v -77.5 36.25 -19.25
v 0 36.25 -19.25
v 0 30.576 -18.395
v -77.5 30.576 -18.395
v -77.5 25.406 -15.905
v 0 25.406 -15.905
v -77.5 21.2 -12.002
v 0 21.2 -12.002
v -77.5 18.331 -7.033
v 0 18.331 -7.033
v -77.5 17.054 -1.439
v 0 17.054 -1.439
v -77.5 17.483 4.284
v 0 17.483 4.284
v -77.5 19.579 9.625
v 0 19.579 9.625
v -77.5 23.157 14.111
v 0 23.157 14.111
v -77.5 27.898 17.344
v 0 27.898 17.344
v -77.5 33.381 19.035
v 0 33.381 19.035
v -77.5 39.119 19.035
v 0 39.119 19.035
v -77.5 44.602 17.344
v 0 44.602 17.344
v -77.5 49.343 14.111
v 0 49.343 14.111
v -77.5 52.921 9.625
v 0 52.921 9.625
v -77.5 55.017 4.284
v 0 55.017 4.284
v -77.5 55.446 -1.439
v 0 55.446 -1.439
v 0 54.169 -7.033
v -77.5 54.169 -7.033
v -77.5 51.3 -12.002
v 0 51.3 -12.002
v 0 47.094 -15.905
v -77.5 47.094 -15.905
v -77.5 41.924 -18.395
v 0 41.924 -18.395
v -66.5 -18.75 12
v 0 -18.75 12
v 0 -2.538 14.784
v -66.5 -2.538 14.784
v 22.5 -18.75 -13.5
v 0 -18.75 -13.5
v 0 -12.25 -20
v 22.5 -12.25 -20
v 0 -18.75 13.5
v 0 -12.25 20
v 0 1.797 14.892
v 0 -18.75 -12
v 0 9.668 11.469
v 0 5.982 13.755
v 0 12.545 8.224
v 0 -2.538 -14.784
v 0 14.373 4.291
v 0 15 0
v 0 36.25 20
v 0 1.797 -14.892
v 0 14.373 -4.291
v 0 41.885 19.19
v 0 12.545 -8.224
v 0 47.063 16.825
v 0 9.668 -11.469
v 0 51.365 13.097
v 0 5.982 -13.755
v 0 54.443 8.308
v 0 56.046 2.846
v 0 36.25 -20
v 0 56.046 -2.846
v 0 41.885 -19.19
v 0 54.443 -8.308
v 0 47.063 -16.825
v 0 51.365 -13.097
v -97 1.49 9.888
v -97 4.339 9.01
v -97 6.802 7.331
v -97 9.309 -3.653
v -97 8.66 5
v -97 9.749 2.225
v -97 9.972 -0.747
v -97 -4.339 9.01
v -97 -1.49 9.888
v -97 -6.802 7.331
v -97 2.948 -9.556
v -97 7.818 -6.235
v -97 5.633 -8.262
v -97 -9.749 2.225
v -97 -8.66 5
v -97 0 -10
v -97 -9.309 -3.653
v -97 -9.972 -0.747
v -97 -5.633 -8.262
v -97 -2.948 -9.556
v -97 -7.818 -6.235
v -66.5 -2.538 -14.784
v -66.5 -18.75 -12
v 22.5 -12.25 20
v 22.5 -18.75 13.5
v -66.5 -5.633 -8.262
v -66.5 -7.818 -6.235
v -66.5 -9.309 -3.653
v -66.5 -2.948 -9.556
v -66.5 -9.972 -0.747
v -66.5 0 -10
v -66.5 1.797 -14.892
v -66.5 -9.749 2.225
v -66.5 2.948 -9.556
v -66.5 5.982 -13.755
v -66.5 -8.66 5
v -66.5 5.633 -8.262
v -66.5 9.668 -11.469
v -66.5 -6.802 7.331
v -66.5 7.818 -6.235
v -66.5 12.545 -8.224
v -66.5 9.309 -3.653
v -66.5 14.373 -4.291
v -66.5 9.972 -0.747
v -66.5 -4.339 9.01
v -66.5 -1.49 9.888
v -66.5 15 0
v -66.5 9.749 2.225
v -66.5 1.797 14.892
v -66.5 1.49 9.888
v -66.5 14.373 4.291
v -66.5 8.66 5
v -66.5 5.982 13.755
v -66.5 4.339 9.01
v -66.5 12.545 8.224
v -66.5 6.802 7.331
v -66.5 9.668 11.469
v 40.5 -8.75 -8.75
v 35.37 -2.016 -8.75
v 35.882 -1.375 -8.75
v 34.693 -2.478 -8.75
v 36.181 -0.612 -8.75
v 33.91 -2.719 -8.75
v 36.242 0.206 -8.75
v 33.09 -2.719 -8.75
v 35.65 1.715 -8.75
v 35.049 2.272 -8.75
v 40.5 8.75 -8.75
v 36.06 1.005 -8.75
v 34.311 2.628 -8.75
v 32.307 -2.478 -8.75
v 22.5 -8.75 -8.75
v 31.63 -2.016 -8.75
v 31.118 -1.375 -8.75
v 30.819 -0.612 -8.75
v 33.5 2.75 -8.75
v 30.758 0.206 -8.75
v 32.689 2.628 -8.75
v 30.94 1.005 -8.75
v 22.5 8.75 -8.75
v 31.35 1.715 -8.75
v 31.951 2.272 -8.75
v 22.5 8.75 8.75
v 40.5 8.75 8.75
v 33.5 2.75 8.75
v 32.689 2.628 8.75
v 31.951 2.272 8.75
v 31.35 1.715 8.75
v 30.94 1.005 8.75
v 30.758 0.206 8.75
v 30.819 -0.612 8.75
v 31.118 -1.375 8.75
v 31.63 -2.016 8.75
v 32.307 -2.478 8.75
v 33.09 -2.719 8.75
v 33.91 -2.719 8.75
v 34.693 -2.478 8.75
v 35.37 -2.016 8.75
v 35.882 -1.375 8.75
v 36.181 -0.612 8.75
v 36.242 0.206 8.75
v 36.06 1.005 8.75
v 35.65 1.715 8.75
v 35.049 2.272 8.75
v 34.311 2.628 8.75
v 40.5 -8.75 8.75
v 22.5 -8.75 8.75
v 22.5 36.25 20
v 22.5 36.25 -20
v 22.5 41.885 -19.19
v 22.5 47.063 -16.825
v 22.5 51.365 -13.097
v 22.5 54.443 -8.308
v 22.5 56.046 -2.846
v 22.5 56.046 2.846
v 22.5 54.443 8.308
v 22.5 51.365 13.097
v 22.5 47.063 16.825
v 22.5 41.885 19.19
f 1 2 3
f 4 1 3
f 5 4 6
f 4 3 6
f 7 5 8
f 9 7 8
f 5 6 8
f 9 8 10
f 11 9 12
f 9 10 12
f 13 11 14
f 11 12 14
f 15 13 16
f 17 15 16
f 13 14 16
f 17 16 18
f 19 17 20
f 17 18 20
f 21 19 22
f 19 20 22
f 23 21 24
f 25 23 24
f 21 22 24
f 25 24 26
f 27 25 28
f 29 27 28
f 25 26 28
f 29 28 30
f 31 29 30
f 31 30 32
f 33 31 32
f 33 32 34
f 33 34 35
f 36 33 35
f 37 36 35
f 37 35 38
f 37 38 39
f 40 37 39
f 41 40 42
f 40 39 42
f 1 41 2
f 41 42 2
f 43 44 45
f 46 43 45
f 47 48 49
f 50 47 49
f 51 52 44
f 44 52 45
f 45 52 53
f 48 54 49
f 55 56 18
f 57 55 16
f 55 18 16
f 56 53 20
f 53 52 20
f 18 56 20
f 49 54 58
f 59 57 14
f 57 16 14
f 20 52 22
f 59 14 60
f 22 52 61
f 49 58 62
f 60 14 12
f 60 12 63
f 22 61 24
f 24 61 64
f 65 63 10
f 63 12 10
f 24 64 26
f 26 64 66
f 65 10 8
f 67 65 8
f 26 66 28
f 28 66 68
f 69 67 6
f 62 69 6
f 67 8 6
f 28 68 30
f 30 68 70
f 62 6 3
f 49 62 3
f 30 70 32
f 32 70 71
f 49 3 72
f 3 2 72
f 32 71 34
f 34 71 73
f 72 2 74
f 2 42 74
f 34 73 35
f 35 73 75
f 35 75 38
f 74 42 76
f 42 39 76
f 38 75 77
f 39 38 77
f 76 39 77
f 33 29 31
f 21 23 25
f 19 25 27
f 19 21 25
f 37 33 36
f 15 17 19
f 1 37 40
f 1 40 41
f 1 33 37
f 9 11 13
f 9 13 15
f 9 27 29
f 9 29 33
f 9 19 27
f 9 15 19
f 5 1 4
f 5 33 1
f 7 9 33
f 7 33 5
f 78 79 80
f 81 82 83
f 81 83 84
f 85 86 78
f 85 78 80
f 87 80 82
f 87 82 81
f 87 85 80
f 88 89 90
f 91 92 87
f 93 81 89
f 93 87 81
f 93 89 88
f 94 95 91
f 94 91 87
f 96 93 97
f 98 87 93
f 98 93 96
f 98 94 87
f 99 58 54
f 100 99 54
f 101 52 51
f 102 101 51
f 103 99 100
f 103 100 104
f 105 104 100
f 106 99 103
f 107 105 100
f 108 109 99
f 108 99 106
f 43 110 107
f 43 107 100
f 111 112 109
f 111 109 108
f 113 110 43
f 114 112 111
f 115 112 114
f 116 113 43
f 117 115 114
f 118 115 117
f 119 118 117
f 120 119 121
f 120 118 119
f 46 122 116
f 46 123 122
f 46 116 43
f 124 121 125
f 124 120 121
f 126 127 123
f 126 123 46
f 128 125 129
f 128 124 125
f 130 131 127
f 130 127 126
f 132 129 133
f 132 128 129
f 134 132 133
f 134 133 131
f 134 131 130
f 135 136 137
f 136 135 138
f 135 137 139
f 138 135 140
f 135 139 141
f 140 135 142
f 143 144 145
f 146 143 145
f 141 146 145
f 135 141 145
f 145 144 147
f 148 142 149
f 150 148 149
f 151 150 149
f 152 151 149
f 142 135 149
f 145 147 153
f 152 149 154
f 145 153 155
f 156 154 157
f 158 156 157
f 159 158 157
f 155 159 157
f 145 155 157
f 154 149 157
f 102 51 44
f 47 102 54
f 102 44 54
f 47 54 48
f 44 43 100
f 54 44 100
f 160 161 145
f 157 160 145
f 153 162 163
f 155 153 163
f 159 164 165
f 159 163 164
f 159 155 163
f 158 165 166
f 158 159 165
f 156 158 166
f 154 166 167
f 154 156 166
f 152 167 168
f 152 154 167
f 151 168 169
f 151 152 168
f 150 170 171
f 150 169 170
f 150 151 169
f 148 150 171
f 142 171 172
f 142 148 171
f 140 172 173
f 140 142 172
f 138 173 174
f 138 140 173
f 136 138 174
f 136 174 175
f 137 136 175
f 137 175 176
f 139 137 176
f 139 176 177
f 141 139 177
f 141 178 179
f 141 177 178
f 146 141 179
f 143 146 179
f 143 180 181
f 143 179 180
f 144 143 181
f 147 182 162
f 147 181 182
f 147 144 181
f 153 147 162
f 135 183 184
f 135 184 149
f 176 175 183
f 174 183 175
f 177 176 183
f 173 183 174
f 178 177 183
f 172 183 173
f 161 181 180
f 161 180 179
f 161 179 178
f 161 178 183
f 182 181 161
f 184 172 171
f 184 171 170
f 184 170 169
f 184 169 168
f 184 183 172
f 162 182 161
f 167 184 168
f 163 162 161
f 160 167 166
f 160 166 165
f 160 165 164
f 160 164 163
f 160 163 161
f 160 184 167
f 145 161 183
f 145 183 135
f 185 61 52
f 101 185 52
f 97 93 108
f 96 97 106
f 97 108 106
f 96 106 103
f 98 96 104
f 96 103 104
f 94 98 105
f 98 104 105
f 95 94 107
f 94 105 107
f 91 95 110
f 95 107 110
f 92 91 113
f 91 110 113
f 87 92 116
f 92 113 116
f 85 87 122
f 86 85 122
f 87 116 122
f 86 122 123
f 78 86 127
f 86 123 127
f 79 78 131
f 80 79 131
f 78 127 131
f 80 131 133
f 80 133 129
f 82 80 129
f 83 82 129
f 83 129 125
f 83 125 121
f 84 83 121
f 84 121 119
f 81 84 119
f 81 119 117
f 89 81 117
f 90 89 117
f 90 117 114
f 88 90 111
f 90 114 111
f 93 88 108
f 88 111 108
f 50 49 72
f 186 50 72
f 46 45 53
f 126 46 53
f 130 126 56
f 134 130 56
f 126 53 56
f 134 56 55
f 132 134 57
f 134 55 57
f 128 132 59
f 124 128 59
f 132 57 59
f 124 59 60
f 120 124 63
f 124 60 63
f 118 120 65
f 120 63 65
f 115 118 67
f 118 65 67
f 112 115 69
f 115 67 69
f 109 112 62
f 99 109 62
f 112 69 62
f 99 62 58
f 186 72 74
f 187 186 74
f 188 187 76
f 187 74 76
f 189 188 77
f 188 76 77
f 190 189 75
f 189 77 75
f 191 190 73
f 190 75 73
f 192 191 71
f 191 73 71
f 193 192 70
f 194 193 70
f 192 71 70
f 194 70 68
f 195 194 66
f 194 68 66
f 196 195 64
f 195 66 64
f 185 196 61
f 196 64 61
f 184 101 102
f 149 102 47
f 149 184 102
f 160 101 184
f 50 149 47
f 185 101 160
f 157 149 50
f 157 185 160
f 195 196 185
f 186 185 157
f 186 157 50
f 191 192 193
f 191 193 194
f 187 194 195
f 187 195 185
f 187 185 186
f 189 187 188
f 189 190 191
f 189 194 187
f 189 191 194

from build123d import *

# Parameters (mm, degrees)
SKETCH1_R               = 20
BOSS_EXTRUDE1_DEPTH     = 22.5
SKETCH3_W               = 17.5
SKETCH3_H               = 17.5
BOSS_EXTRUDE2_DEPTH     = 18
CUT_EXTRUDE1_DEPTH      = 76.039156445
CUT_EXTRUDE1_DEPTH_BACK = 76.039156445
SKETCH4_R               = 2.75
BOSS_EXTRUDE3_DEPTH     = 66.5
SKETCH6_R               = 19.25
BOSS_EXTRUDE4_DEPTH     = 77.5
SKETCH7_R               = 10
BOSS_EXTRUDE5_DEPTH     = 30.5


with BuildPart() as part:
    # Sketch1 → Boss-Extrude1 (new body)
    with BuildSketch(Plane(origin=(0, 0, 0), x_dir=(0, 0, -1), z_dir=(1, 0, 0))):
        with Locations((0, 36.25)):
            Circle(SKETCH1_R)
        with BuildLine():
            ThreePointArc((20, 36.25), (0, 16.25), (-20, 36.25))
            Line((-20, 36.25), (-20, -12.25))
            Line((-20, -12.25), (-13.5, -18.75))
            Line((-13.5, -18.75), (13.5, -18.75))
            Line((13.5, -18.75), (20, -12.25))
            Line((20, -12.25), (20, 36.25))
        make_face()
    extrude(amount=BOSS_EXTRUDE1_DEPTH)

    # Sketch3 → Boss-Extrude2 (add)
    with BuildSketch(Plane(origin=(22.5, 0, 0), x_dir=(0, 0, -1), z_dir=(1, 0, 0))):
        Rectangle(SKETCH3_W, SKETCH3_H)
    extrude(amount=BOSS_EXTRUDE2_DEPTH)

    # Sketch4 → Cut-Extrude1 (cut, two sides: drawn at the far end of the back side and taken through both)
    with BuildSketch(Plane.XY.offset(8.75).offset(-CUT_EXTRUDE1_DEPTH_BACK)):
        with Locations(Location((33.5, 0, 0), (0, 0, 90))):
            Circle(SKETCH4_R)
    extrude(amount=CUT_EXTRUDE1_DEPTH + CUT_EXTRUDE1_DEPTH_BACK, mode=Mode.SUBTRACT)

    # Sketch5 → Boss-Extrude3 (add)
    with BuildSketch(Plane.ZY):
        with BuildLine():
            Line((-12, -18.75), (12, -18.75))
            Line((12, -18.75), (14.783645942, -2.538466597))
            ThreePointArc((14.783645942, -2.538466597), (0, 15), (-14.783645942, -2.538466597))
            Line((-14.783645942, -2.538466597), (-12, -18.75))
        make_face()
    extrude(amount=BOSS_EXTRUDE3_DEPTH)

    # Sketch6 → Boss-Extrude4 (add)
    with BuildSketch(Plane.ZY):
        with Locations(Location((0, 36.25, 0), (0, 0, 180))):
            Circle(SKETCH6_R)
    extrude(amount=BOSS_EXTRUDE4_DEPTH)

    # Sketch7 → Boss-Extrude5 (add)
    with BuildSketch(Plane.ZY.offset(66.5)):
        with Locations(Location((0, 0, 0), (0, 0, 180))):
            Circle(SKETCH7_R)
    extrude(amount=BOSS_EXTRUDE5_DEPTH)


solid = part.part
